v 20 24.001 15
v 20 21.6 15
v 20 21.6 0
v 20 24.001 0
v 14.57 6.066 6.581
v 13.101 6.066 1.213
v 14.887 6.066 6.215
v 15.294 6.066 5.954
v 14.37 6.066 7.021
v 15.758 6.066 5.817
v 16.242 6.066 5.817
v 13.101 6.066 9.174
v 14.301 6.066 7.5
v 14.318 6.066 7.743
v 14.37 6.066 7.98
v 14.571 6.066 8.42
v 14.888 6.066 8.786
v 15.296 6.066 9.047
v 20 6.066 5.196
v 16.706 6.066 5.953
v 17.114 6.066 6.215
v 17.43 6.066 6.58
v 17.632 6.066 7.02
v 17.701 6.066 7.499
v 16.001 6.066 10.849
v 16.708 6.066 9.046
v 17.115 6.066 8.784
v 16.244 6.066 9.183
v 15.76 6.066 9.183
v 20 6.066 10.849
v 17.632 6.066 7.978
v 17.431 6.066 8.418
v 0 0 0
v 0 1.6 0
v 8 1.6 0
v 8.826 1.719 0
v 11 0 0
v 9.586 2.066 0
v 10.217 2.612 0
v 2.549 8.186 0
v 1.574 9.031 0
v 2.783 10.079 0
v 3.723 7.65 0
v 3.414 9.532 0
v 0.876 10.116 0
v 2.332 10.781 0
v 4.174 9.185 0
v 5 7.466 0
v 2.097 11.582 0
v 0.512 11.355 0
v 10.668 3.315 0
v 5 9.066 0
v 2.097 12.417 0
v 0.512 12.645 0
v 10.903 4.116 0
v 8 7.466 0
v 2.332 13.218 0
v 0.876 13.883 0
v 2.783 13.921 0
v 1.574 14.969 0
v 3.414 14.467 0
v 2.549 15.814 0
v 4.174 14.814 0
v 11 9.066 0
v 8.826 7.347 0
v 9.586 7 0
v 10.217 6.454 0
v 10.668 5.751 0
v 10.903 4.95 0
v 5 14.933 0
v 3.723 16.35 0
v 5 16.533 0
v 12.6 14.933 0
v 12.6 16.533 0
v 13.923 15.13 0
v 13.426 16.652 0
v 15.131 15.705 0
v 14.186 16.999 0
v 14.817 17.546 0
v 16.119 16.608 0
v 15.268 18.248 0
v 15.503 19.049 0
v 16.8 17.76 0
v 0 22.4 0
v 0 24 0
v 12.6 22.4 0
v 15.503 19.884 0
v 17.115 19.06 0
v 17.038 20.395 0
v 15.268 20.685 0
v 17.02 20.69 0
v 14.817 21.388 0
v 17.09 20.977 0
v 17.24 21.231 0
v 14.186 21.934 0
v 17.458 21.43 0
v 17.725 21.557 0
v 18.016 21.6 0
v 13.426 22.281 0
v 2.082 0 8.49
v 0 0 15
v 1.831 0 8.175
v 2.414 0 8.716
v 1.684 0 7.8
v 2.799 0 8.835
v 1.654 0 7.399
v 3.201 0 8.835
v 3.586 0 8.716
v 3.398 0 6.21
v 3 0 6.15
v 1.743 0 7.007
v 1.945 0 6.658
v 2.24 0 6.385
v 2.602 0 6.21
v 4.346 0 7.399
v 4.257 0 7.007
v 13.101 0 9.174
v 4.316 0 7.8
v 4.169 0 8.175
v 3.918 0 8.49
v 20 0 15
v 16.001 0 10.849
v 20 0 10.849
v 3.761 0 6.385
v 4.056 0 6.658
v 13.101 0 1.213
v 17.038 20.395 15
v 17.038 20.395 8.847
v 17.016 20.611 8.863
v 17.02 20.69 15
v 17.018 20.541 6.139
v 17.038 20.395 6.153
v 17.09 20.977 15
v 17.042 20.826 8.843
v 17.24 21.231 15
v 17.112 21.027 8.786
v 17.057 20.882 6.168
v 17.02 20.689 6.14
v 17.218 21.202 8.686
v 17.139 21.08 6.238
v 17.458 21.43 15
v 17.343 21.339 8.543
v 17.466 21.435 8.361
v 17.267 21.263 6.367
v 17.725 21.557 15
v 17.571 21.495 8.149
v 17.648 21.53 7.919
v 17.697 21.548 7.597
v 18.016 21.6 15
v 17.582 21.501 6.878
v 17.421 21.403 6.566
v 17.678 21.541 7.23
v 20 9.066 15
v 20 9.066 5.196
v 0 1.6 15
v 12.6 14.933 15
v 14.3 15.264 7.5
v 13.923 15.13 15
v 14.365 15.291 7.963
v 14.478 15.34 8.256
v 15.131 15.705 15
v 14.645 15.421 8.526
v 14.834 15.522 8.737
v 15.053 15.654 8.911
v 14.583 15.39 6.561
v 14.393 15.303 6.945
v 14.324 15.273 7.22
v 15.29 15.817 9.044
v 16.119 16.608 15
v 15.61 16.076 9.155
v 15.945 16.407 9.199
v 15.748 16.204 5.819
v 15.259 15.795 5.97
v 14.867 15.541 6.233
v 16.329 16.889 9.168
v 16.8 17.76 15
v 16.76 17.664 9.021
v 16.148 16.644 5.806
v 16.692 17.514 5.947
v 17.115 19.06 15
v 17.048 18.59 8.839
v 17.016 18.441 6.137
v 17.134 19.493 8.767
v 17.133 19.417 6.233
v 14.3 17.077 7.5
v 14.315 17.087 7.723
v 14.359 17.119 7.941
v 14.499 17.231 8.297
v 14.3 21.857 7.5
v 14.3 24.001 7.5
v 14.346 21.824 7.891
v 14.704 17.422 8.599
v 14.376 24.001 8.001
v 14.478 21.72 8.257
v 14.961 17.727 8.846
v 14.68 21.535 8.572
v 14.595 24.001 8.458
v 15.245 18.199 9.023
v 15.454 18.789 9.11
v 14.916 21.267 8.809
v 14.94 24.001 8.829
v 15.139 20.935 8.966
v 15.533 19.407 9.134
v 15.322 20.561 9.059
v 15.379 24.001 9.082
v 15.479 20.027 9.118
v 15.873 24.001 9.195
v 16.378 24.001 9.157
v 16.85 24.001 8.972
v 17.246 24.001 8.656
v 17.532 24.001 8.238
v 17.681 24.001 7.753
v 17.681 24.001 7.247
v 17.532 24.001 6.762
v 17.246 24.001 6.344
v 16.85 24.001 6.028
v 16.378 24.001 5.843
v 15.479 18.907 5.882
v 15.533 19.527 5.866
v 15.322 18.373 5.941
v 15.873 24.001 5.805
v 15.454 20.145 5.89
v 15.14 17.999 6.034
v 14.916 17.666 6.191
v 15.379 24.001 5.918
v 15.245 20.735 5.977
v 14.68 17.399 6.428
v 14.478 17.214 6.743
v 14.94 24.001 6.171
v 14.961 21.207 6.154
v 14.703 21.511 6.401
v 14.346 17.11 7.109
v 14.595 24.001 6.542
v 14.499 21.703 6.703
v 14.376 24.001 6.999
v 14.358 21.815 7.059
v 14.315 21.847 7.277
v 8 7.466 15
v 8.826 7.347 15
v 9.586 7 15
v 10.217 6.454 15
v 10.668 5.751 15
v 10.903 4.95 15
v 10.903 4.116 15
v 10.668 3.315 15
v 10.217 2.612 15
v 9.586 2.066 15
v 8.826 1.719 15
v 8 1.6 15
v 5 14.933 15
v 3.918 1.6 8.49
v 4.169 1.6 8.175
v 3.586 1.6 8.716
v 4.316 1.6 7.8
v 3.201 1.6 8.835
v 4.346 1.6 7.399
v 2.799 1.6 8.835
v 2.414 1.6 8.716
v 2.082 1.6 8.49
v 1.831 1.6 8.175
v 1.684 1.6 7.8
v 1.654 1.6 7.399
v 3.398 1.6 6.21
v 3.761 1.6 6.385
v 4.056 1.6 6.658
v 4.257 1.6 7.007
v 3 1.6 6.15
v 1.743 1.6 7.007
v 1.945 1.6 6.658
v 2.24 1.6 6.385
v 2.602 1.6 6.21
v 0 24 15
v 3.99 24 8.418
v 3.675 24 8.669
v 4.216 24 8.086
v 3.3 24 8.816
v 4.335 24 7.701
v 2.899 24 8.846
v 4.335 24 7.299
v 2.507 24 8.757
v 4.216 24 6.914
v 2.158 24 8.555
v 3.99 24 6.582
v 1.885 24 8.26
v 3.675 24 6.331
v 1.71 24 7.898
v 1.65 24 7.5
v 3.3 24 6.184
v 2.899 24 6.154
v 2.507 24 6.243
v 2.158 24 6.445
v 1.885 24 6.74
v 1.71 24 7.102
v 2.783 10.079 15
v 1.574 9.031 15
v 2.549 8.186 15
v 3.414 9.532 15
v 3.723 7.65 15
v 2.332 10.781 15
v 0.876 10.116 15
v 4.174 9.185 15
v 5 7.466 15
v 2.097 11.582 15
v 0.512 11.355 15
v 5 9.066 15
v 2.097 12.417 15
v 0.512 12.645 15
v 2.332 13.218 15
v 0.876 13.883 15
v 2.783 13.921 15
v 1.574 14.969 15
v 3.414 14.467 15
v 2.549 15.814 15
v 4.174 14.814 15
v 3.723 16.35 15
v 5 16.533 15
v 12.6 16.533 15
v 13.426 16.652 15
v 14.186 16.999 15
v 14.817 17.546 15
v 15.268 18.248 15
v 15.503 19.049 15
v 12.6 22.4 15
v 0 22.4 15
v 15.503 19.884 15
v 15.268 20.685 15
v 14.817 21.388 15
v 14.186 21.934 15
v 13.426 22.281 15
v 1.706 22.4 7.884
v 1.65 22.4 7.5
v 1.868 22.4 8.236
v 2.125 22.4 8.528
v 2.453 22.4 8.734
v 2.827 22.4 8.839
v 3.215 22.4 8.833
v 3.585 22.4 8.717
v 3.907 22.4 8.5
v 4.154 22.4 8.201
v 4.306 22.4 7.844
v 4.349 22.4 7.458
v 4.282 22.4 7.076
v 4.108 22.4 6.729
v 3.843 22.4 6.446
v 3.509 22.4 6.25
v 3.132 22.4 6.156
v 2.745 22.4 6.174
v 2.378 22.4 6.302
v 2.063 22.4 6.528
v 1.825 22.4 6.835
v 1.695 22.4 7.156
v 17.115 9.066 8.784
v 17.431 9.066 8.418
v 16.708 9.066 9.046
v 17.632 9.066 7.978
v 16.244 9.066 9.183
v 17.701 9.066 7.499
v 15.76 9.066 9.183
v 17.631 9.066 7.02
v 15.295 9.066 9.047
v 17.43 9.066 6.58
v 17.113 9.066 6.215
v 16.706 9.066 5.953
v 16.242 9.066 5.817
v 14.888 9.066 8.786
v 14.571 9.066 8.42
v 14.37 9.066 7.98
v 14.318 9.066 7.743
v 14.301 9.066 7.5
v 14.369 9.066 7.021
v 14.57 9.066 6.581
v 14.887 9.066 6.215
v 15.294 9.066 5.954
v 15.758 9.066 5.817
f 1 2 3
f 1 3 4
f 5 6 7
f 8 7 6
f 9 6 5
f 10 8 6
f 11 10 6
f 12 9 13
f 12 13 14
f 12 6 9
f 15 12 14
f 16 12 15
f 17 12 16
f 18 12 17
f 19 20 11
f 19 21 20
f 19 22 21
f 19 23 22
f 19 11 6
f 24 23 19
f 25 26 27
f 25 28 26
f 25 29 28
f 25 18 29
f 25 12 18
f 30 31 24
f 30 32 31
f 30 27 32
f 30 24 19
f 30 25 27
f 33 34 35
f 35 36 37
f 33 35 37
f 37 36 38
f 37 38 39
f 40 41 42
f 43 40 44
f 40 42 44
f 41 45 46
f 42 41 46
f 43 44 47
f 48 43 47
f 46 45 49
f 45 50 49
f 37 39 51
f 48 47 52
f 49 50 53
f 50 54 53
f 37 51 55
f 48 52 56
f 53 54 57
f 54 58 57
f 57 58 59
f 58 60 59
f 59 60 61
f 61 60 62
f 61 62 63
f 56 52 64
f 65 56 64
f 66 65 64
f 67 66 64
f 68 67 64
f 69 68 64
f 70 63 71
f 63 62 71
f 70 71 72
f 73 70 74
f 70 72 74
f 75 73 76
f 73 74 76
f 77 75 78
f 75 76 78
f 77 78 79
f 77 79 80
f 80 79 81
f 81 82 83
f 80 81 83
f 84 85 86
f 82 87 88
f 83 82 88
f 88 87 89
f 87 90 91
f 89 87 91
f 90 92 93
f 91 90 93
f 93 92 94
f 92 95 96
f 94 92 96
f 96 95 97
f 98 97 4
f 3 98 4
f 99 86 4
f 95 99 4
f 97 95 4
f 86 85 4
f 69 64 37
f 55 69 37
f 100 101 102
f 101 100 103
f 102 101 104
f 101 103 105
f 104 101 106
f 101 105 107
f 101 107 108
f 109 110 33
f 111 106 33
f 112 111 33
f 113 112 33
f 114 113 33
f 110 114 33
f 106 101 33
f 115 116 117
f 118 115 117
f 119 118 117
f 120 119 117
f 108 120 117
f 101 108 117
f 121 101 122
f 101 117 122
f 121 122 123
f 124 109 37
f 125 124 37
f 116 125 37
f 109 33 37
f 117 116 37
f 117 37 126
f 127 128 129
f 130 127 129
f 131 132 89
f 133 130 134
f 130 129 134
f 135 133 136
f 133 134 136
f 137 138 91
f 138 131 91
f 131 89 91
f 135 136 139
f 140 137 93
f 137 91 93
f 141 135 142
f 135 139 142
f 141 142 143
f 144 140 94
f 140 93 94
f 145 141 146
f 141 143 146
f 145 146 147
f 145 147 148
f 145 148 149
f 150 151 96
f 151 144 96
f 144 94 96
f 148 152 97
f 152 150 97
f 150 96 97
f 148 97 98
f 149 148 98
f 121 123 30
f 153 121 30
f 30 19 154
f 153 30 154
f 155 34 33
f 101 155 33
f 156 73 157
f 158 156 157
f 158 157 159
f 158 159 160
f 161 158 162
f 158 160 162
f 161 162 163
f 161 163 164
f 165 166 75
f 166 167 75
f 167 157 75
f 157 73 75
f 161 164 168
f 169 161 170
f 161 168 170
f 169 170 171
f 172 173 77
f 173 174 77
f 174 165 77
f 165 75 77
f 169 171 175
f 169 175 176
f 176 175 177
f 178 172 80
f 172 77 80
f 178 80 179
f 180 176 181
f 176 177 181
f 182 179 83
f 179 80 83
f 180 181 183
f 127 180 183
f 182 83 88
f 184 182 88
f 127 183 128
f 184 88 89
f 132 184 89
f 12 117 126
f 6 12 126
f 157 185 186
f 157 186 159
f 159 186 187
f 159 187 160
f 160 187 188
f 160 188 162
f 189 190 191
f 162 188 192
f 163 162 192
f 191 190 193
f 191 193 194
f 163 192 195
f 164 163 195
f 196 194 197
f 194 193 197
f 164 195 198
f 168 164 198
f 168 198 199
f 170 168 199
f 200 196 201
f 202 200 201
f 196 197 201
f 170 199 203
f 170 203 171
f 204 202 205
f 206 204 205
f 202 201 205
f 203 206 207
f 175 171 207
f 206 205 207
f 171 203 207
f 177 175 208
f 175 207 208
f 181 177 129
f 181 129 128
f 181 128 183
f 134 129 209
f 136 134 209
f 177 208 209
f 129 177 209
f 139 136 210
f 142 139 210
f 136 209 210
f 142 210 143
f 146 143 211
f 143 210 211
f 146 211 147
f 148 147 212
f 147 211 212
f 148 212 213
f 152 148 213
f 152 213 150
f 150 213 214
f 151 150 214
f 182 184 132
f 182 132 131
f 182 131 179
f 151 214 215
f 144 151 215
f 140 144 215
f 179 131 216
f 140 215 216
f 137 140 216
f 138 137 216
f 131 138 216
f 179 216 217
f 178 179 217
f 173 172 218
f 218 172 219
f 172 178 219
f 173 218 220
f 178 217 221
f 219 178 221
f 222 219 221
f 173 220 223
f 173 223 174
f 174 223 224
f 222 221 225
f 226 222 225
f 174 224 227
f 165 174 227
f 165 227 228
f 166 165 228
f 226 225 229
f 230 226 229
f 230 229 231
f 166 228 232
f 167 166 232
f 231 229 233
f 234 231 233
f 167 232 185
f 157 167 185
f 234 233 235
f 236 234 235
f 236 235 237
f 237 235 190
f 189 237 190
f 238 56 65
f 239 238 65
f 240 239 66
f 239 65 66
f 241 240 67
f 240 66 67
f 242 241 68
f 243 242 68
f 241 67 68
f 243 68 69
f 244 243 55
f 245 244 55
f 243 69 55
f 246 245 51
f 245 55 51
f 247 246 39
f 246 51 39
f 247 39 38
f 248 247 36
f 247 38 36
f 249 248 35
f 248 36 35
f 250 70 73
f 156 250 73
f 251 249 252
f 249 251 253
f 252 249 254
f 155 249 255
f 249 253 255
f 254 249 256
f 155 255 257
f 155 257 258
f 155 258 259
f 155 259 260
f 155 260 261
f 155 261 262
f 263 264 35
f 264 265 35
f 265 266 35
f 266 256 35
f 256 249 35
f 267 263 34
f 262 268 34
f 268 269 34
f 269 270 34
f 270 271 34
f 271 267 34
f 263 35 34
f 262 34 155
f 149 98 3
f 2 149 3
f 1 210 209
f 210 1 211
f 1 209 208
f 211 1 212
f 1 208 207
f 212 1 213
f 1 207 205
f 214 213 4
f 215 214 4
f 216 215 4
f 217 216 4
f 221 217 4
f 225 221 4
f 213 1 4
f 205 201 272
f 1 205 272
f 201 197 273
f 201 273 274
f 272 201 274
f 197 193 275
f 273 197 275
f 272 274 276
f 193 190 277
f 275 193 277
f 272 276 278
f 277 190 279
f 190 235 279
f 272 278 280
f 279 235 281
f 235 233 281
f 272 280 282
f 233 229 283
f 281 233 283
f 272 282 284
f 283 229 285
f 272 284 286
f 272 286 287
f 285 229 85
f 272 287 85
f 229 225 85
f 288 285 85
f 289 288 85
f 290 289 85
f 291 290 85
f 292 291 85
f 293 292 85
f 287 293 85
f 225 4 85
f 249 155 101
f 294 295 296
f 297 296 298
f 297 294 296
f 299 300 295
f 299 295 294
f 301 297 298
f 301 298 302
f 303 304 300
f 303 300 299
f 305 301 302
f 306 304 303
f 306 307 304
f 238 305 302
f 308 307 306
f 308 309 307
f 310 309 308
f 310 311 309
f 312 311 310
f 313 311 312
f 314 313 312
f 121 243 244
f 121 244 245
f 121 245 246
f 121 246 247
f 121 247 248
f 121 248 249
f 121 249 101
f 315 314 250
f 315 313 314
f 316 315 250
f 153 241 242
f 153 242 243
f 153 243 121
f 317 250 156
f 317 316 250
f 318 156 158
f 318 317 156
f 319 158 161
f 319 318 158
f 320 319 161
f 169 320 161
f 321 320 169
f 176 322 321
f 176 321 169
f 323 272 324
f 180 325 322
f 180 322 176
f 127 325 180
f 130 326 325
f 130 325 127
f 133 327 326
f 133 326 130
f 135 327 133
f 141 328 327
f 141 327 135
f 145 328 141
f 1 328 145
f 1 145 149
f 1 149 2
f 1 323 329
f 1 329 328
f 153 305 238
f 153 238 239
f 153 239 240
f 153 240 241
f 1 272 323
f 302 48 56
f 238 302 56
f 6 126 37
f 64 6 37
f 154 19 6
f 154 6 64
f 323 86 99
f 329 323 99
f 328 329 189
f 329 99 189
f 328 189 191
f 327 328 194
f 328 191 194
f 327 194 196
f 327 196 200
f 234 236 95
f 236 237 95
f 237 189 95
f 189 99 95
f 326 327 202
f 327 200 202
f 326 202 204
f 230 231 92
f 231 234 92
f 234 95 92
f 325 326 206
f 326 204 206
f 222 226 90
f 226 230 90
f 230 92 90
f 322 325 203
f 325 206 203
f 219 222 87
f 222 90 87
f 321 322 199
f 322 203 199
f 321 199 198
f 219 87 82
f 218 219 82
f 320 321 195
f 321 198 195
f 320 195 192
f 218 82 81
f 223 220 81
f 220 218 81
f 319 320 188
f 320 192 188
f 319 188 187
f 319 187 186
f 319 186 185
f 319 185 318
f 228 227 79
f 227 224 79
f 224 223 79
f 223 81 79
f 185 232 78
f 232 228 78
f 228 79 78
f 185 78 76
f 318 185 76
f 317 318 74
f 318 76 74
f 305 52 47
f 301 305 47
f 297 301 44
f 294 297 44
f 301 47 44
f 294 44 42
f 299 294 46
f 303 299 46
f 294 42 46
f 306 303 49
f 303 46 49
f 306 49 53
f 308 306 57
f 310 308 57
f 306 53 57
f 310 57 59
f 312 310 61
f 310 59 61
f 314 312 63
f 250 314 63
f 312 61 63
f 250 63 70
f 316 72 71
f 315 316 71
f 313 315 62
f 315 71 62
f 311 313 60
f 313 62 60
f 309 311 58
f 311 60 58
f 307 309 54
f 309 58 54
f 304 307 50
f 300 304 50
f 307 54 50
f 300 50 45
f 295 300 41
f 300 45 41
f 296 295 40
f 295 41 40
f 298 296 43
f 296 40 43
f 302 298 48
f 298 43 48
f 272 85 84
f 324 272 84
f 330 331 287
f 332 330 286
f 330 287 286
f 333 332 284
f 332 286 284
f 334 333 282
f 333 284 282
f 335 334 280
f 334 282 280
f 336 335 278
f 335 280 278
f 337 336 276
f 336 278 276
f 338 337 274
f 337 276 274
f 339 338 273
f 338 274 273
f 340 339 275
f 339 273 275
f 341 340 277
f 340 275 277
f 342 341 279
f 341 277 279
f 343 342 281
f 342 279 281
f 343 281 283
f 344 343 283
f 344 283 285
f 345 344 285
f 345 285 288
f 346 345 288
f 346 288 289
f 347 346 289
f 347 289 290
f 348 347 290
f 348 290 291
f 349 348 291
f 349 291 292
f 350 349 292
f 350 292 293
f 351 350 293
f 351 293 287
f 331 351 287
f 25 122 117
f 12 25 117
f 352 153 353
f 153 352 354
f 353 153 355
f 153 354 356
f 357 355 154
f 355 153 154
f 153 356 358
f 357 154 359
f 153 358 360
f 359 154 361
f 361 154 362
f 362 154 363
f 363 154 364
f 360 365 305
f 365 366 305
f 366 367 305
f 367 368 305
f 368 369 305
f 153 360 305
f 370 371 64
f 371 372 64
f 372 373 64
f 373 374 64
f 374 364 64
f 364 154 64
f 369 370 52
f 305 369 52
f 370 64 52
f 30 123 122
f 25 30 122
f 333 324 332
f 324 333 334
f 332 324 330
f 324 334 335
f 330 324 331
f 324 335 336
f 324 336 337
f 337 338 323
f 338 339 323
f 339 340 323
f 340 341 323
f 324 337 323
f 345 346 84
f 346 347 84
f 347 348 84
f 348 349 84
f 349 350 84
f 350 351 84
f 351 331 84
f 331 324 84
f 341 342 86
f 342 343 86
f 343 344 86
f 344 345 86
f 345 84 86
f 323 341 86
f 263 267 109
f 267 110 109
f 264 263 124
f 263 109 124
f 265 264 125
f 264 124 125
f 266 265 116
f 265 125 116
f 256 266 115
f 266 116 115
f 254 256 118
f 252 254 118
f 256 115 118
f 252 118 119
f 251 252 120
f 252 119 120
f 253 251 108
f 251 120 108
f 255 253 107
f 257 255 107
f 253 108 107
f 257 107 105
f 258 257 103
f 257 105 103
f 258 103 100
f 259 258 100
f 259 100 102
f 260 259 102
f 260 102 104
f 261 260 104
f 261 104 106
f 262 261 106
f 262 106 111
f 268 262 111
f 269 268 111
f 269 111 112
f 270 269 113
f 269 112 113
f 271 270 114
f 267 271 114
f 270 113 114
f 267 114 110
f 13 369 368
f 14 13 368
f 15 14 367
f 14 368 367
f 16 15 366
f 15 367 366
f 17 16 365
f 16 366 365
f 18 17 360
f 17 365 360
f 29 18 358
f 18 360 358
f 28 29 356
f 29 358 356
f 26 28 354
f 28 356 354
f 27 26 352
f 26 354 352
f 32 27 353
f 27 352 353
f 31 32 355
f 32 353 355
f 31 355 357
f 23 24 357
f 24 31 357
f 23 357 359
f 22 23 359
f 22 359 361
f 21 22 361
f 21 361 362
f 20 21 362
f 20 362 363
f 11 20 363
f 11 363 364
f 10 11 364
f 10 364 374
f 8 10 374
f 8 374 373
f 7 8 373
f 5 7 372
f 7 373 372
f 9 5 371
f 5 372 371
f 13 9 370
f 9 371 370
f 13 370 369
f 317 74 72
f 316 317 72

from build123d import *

# Parameters (mm, degrees)
BOSS_EXTRUDE1_DEPTH = 15
SKETCH2_R           = 1.7
CUT_EXTRUDE1_DEPTH  = 35.655960635
CUT_EXTRUDE2_DEPTH  = 6.066365529
CUT_EXTRUDE3_REACH  = 36.656
SKETCH4_R           = 1.35
CUT_EXTRUDE4_REACH  = 36.656
SKETCH5_R           = 1.350000001
CHAMFER2_SIZE       = 9
CHAMFER2_SIZE2      = 5.196152423


with BuildPart() as part:
    # Sketch1 → Boss-Extrude1 (new body)
    with BuildSketch(Plane.XY):
        with BuildLine():
            Line((0, 0), (20, 0))
            Line((20, 0), (20, 9.066365529))
            Line((20, 9.066365529), (8, 9.066365529))
            Line((8, 9.066365529), (5, 9.066365529))
            ThreePointArc((5, 9.066365529), (2.066666667, 11.999698862), (5, 14.933032196))
            Line((5, 14.933032196), (12.6, 14.933032196))
            ThreePointArc((12.6, 14.933032196), (16.118831006, 16.608004693), (17.03761247, 20.395292))
            ThreePointArc((17.03761247, 20.395292), (17.240267675, 21.230652218), (18.016414611, 21.600100131))
            Line((18.016414611, 21.600100131), (20, 21.600100131))
            Line((20, 21.600100131), (20, 24.000741841))
            Line((20, 24.000741841), (0, 24))
            Line((0, 24), (0, 22.4))
            Line((0, 22.4), (12.6, 22.4))
            ThreePointArc((12.6, 22.4), (15.533250224, 19.466749776), (12.6, 16.533499552))
            Line((12.6, 16.533499552), (5, 16.533499552))
            ThreePointArc((5, 16.533499552), (0.46628242, 11.999781972), (5, 7.466064391))
            Line((5, 7.466064391), (8, 7.466064391))
            ThreePointArc((8, 7.466064391), (10.933032196, 4.533032196), (8, 1.6))
            Line((8, 1.6), (0, 1.6))
            Line((0, 1.6), (0, 0))
        make_face()
    extrude(amount=BOSS_EXTRUDE1_DEPTH)

    # Sketch2 → Cut-Extrude1 (cut, through all)
    with BuildSketch(Plane(origin=(-0.000890209, 23.999999967, 0), x_dir=(0.9999999993120905, 3.709203365043046e-05, 0), z_dir=(-3.709203365043046e-05, 0.9999999993120905, 0))):
        with Locations(Location((16.000890209, -7.5, 0), (0, 0, 180))):
            Circle(SKETCH2_R)
    extrude(amount=-CUT_EXTRUDE1_DEPTH, mode=Mode.SUBTRACT)

    # Sketch3 → Cut-Extrude2 (cut)
    with BuildSketch(Plane.XZ):
        Polygon((21.085370845, -1.090112753), (21.085370845, 10.848631561), (16.00089022, 10.848631561), (13.10089022, 9.174315781), (13.10089022, -1.090112753), align=None)
    extrude(amount=-CUT_EXTRUDE2_DEPTH, mode=Mode.SUBTRACT)

    # Sketch4 → Cut-Extrude3 (cut, up to next)
    with BuildSketch(Plane(origin=(-0.000890209, 23.999999967, 0), x_dir=(0.9999999993120905, 3.709203365043046e-05, 0), z_dir=(-3.709203365043046e-05, 0.9999999993120905, 0)), mode=Mode.PRIVATE) as cut_extrude3_sk1:
        with Locations(Location((3.000890209, -7.5, 0), (0, 0, 180))):
            Circle(SKETCH4_R)
    cut_extrude3_tool1 = extrude(cut_extrude3_sk1.sketch, amount=-CUT_EXTRUDE3_REACH, mode=Mode.PRIVATE) & part.part
    add(cut_extrude3_tool1.solids().sort_by_distance((3, 24.000111, 7.5))[0], mode=Mode.SUBTRACT)

    # Sketch5 → Cut-Extrude4 (cut, up to next)
    with BuildSketch(Plane.XZ, mode=Mode.PRIVATE) as cut_extrude4_sk1:
        with Locations(Location((3.000059349, 7.5, 0), (0, 0, 270))):
            Circle(SKETCH5_R)
    cut_extrude4_tool1 = extrude(cut_extrude4_sk1.sketch, amount=-CUT_EXTRUDE4_REACH, mode=Mode.PRIVATE) & part.part
    add(cut_extrude4_tool1.solids().sort_by_distance((3.000059, 0, 7.5))[0], mode=Mode.SUBTRACT)

    # Chamfer2
    chamfer2_edges = [part.edges().sort_by_distance(p)[0] for p in [
        (20, 7.566365529, 0),
    ]]
    chamfer2_side = [part.faces().sort_by_distance(p)[0] for p in [
        (0.778698106, 11.999781972, 0),
    ]]
    chamfer(chamfer2_edges, length=CHAMFER2_SIZE, length2=CHAMFER2_SIZE2, reference=chamfer2_side[0])


solid = part.part
